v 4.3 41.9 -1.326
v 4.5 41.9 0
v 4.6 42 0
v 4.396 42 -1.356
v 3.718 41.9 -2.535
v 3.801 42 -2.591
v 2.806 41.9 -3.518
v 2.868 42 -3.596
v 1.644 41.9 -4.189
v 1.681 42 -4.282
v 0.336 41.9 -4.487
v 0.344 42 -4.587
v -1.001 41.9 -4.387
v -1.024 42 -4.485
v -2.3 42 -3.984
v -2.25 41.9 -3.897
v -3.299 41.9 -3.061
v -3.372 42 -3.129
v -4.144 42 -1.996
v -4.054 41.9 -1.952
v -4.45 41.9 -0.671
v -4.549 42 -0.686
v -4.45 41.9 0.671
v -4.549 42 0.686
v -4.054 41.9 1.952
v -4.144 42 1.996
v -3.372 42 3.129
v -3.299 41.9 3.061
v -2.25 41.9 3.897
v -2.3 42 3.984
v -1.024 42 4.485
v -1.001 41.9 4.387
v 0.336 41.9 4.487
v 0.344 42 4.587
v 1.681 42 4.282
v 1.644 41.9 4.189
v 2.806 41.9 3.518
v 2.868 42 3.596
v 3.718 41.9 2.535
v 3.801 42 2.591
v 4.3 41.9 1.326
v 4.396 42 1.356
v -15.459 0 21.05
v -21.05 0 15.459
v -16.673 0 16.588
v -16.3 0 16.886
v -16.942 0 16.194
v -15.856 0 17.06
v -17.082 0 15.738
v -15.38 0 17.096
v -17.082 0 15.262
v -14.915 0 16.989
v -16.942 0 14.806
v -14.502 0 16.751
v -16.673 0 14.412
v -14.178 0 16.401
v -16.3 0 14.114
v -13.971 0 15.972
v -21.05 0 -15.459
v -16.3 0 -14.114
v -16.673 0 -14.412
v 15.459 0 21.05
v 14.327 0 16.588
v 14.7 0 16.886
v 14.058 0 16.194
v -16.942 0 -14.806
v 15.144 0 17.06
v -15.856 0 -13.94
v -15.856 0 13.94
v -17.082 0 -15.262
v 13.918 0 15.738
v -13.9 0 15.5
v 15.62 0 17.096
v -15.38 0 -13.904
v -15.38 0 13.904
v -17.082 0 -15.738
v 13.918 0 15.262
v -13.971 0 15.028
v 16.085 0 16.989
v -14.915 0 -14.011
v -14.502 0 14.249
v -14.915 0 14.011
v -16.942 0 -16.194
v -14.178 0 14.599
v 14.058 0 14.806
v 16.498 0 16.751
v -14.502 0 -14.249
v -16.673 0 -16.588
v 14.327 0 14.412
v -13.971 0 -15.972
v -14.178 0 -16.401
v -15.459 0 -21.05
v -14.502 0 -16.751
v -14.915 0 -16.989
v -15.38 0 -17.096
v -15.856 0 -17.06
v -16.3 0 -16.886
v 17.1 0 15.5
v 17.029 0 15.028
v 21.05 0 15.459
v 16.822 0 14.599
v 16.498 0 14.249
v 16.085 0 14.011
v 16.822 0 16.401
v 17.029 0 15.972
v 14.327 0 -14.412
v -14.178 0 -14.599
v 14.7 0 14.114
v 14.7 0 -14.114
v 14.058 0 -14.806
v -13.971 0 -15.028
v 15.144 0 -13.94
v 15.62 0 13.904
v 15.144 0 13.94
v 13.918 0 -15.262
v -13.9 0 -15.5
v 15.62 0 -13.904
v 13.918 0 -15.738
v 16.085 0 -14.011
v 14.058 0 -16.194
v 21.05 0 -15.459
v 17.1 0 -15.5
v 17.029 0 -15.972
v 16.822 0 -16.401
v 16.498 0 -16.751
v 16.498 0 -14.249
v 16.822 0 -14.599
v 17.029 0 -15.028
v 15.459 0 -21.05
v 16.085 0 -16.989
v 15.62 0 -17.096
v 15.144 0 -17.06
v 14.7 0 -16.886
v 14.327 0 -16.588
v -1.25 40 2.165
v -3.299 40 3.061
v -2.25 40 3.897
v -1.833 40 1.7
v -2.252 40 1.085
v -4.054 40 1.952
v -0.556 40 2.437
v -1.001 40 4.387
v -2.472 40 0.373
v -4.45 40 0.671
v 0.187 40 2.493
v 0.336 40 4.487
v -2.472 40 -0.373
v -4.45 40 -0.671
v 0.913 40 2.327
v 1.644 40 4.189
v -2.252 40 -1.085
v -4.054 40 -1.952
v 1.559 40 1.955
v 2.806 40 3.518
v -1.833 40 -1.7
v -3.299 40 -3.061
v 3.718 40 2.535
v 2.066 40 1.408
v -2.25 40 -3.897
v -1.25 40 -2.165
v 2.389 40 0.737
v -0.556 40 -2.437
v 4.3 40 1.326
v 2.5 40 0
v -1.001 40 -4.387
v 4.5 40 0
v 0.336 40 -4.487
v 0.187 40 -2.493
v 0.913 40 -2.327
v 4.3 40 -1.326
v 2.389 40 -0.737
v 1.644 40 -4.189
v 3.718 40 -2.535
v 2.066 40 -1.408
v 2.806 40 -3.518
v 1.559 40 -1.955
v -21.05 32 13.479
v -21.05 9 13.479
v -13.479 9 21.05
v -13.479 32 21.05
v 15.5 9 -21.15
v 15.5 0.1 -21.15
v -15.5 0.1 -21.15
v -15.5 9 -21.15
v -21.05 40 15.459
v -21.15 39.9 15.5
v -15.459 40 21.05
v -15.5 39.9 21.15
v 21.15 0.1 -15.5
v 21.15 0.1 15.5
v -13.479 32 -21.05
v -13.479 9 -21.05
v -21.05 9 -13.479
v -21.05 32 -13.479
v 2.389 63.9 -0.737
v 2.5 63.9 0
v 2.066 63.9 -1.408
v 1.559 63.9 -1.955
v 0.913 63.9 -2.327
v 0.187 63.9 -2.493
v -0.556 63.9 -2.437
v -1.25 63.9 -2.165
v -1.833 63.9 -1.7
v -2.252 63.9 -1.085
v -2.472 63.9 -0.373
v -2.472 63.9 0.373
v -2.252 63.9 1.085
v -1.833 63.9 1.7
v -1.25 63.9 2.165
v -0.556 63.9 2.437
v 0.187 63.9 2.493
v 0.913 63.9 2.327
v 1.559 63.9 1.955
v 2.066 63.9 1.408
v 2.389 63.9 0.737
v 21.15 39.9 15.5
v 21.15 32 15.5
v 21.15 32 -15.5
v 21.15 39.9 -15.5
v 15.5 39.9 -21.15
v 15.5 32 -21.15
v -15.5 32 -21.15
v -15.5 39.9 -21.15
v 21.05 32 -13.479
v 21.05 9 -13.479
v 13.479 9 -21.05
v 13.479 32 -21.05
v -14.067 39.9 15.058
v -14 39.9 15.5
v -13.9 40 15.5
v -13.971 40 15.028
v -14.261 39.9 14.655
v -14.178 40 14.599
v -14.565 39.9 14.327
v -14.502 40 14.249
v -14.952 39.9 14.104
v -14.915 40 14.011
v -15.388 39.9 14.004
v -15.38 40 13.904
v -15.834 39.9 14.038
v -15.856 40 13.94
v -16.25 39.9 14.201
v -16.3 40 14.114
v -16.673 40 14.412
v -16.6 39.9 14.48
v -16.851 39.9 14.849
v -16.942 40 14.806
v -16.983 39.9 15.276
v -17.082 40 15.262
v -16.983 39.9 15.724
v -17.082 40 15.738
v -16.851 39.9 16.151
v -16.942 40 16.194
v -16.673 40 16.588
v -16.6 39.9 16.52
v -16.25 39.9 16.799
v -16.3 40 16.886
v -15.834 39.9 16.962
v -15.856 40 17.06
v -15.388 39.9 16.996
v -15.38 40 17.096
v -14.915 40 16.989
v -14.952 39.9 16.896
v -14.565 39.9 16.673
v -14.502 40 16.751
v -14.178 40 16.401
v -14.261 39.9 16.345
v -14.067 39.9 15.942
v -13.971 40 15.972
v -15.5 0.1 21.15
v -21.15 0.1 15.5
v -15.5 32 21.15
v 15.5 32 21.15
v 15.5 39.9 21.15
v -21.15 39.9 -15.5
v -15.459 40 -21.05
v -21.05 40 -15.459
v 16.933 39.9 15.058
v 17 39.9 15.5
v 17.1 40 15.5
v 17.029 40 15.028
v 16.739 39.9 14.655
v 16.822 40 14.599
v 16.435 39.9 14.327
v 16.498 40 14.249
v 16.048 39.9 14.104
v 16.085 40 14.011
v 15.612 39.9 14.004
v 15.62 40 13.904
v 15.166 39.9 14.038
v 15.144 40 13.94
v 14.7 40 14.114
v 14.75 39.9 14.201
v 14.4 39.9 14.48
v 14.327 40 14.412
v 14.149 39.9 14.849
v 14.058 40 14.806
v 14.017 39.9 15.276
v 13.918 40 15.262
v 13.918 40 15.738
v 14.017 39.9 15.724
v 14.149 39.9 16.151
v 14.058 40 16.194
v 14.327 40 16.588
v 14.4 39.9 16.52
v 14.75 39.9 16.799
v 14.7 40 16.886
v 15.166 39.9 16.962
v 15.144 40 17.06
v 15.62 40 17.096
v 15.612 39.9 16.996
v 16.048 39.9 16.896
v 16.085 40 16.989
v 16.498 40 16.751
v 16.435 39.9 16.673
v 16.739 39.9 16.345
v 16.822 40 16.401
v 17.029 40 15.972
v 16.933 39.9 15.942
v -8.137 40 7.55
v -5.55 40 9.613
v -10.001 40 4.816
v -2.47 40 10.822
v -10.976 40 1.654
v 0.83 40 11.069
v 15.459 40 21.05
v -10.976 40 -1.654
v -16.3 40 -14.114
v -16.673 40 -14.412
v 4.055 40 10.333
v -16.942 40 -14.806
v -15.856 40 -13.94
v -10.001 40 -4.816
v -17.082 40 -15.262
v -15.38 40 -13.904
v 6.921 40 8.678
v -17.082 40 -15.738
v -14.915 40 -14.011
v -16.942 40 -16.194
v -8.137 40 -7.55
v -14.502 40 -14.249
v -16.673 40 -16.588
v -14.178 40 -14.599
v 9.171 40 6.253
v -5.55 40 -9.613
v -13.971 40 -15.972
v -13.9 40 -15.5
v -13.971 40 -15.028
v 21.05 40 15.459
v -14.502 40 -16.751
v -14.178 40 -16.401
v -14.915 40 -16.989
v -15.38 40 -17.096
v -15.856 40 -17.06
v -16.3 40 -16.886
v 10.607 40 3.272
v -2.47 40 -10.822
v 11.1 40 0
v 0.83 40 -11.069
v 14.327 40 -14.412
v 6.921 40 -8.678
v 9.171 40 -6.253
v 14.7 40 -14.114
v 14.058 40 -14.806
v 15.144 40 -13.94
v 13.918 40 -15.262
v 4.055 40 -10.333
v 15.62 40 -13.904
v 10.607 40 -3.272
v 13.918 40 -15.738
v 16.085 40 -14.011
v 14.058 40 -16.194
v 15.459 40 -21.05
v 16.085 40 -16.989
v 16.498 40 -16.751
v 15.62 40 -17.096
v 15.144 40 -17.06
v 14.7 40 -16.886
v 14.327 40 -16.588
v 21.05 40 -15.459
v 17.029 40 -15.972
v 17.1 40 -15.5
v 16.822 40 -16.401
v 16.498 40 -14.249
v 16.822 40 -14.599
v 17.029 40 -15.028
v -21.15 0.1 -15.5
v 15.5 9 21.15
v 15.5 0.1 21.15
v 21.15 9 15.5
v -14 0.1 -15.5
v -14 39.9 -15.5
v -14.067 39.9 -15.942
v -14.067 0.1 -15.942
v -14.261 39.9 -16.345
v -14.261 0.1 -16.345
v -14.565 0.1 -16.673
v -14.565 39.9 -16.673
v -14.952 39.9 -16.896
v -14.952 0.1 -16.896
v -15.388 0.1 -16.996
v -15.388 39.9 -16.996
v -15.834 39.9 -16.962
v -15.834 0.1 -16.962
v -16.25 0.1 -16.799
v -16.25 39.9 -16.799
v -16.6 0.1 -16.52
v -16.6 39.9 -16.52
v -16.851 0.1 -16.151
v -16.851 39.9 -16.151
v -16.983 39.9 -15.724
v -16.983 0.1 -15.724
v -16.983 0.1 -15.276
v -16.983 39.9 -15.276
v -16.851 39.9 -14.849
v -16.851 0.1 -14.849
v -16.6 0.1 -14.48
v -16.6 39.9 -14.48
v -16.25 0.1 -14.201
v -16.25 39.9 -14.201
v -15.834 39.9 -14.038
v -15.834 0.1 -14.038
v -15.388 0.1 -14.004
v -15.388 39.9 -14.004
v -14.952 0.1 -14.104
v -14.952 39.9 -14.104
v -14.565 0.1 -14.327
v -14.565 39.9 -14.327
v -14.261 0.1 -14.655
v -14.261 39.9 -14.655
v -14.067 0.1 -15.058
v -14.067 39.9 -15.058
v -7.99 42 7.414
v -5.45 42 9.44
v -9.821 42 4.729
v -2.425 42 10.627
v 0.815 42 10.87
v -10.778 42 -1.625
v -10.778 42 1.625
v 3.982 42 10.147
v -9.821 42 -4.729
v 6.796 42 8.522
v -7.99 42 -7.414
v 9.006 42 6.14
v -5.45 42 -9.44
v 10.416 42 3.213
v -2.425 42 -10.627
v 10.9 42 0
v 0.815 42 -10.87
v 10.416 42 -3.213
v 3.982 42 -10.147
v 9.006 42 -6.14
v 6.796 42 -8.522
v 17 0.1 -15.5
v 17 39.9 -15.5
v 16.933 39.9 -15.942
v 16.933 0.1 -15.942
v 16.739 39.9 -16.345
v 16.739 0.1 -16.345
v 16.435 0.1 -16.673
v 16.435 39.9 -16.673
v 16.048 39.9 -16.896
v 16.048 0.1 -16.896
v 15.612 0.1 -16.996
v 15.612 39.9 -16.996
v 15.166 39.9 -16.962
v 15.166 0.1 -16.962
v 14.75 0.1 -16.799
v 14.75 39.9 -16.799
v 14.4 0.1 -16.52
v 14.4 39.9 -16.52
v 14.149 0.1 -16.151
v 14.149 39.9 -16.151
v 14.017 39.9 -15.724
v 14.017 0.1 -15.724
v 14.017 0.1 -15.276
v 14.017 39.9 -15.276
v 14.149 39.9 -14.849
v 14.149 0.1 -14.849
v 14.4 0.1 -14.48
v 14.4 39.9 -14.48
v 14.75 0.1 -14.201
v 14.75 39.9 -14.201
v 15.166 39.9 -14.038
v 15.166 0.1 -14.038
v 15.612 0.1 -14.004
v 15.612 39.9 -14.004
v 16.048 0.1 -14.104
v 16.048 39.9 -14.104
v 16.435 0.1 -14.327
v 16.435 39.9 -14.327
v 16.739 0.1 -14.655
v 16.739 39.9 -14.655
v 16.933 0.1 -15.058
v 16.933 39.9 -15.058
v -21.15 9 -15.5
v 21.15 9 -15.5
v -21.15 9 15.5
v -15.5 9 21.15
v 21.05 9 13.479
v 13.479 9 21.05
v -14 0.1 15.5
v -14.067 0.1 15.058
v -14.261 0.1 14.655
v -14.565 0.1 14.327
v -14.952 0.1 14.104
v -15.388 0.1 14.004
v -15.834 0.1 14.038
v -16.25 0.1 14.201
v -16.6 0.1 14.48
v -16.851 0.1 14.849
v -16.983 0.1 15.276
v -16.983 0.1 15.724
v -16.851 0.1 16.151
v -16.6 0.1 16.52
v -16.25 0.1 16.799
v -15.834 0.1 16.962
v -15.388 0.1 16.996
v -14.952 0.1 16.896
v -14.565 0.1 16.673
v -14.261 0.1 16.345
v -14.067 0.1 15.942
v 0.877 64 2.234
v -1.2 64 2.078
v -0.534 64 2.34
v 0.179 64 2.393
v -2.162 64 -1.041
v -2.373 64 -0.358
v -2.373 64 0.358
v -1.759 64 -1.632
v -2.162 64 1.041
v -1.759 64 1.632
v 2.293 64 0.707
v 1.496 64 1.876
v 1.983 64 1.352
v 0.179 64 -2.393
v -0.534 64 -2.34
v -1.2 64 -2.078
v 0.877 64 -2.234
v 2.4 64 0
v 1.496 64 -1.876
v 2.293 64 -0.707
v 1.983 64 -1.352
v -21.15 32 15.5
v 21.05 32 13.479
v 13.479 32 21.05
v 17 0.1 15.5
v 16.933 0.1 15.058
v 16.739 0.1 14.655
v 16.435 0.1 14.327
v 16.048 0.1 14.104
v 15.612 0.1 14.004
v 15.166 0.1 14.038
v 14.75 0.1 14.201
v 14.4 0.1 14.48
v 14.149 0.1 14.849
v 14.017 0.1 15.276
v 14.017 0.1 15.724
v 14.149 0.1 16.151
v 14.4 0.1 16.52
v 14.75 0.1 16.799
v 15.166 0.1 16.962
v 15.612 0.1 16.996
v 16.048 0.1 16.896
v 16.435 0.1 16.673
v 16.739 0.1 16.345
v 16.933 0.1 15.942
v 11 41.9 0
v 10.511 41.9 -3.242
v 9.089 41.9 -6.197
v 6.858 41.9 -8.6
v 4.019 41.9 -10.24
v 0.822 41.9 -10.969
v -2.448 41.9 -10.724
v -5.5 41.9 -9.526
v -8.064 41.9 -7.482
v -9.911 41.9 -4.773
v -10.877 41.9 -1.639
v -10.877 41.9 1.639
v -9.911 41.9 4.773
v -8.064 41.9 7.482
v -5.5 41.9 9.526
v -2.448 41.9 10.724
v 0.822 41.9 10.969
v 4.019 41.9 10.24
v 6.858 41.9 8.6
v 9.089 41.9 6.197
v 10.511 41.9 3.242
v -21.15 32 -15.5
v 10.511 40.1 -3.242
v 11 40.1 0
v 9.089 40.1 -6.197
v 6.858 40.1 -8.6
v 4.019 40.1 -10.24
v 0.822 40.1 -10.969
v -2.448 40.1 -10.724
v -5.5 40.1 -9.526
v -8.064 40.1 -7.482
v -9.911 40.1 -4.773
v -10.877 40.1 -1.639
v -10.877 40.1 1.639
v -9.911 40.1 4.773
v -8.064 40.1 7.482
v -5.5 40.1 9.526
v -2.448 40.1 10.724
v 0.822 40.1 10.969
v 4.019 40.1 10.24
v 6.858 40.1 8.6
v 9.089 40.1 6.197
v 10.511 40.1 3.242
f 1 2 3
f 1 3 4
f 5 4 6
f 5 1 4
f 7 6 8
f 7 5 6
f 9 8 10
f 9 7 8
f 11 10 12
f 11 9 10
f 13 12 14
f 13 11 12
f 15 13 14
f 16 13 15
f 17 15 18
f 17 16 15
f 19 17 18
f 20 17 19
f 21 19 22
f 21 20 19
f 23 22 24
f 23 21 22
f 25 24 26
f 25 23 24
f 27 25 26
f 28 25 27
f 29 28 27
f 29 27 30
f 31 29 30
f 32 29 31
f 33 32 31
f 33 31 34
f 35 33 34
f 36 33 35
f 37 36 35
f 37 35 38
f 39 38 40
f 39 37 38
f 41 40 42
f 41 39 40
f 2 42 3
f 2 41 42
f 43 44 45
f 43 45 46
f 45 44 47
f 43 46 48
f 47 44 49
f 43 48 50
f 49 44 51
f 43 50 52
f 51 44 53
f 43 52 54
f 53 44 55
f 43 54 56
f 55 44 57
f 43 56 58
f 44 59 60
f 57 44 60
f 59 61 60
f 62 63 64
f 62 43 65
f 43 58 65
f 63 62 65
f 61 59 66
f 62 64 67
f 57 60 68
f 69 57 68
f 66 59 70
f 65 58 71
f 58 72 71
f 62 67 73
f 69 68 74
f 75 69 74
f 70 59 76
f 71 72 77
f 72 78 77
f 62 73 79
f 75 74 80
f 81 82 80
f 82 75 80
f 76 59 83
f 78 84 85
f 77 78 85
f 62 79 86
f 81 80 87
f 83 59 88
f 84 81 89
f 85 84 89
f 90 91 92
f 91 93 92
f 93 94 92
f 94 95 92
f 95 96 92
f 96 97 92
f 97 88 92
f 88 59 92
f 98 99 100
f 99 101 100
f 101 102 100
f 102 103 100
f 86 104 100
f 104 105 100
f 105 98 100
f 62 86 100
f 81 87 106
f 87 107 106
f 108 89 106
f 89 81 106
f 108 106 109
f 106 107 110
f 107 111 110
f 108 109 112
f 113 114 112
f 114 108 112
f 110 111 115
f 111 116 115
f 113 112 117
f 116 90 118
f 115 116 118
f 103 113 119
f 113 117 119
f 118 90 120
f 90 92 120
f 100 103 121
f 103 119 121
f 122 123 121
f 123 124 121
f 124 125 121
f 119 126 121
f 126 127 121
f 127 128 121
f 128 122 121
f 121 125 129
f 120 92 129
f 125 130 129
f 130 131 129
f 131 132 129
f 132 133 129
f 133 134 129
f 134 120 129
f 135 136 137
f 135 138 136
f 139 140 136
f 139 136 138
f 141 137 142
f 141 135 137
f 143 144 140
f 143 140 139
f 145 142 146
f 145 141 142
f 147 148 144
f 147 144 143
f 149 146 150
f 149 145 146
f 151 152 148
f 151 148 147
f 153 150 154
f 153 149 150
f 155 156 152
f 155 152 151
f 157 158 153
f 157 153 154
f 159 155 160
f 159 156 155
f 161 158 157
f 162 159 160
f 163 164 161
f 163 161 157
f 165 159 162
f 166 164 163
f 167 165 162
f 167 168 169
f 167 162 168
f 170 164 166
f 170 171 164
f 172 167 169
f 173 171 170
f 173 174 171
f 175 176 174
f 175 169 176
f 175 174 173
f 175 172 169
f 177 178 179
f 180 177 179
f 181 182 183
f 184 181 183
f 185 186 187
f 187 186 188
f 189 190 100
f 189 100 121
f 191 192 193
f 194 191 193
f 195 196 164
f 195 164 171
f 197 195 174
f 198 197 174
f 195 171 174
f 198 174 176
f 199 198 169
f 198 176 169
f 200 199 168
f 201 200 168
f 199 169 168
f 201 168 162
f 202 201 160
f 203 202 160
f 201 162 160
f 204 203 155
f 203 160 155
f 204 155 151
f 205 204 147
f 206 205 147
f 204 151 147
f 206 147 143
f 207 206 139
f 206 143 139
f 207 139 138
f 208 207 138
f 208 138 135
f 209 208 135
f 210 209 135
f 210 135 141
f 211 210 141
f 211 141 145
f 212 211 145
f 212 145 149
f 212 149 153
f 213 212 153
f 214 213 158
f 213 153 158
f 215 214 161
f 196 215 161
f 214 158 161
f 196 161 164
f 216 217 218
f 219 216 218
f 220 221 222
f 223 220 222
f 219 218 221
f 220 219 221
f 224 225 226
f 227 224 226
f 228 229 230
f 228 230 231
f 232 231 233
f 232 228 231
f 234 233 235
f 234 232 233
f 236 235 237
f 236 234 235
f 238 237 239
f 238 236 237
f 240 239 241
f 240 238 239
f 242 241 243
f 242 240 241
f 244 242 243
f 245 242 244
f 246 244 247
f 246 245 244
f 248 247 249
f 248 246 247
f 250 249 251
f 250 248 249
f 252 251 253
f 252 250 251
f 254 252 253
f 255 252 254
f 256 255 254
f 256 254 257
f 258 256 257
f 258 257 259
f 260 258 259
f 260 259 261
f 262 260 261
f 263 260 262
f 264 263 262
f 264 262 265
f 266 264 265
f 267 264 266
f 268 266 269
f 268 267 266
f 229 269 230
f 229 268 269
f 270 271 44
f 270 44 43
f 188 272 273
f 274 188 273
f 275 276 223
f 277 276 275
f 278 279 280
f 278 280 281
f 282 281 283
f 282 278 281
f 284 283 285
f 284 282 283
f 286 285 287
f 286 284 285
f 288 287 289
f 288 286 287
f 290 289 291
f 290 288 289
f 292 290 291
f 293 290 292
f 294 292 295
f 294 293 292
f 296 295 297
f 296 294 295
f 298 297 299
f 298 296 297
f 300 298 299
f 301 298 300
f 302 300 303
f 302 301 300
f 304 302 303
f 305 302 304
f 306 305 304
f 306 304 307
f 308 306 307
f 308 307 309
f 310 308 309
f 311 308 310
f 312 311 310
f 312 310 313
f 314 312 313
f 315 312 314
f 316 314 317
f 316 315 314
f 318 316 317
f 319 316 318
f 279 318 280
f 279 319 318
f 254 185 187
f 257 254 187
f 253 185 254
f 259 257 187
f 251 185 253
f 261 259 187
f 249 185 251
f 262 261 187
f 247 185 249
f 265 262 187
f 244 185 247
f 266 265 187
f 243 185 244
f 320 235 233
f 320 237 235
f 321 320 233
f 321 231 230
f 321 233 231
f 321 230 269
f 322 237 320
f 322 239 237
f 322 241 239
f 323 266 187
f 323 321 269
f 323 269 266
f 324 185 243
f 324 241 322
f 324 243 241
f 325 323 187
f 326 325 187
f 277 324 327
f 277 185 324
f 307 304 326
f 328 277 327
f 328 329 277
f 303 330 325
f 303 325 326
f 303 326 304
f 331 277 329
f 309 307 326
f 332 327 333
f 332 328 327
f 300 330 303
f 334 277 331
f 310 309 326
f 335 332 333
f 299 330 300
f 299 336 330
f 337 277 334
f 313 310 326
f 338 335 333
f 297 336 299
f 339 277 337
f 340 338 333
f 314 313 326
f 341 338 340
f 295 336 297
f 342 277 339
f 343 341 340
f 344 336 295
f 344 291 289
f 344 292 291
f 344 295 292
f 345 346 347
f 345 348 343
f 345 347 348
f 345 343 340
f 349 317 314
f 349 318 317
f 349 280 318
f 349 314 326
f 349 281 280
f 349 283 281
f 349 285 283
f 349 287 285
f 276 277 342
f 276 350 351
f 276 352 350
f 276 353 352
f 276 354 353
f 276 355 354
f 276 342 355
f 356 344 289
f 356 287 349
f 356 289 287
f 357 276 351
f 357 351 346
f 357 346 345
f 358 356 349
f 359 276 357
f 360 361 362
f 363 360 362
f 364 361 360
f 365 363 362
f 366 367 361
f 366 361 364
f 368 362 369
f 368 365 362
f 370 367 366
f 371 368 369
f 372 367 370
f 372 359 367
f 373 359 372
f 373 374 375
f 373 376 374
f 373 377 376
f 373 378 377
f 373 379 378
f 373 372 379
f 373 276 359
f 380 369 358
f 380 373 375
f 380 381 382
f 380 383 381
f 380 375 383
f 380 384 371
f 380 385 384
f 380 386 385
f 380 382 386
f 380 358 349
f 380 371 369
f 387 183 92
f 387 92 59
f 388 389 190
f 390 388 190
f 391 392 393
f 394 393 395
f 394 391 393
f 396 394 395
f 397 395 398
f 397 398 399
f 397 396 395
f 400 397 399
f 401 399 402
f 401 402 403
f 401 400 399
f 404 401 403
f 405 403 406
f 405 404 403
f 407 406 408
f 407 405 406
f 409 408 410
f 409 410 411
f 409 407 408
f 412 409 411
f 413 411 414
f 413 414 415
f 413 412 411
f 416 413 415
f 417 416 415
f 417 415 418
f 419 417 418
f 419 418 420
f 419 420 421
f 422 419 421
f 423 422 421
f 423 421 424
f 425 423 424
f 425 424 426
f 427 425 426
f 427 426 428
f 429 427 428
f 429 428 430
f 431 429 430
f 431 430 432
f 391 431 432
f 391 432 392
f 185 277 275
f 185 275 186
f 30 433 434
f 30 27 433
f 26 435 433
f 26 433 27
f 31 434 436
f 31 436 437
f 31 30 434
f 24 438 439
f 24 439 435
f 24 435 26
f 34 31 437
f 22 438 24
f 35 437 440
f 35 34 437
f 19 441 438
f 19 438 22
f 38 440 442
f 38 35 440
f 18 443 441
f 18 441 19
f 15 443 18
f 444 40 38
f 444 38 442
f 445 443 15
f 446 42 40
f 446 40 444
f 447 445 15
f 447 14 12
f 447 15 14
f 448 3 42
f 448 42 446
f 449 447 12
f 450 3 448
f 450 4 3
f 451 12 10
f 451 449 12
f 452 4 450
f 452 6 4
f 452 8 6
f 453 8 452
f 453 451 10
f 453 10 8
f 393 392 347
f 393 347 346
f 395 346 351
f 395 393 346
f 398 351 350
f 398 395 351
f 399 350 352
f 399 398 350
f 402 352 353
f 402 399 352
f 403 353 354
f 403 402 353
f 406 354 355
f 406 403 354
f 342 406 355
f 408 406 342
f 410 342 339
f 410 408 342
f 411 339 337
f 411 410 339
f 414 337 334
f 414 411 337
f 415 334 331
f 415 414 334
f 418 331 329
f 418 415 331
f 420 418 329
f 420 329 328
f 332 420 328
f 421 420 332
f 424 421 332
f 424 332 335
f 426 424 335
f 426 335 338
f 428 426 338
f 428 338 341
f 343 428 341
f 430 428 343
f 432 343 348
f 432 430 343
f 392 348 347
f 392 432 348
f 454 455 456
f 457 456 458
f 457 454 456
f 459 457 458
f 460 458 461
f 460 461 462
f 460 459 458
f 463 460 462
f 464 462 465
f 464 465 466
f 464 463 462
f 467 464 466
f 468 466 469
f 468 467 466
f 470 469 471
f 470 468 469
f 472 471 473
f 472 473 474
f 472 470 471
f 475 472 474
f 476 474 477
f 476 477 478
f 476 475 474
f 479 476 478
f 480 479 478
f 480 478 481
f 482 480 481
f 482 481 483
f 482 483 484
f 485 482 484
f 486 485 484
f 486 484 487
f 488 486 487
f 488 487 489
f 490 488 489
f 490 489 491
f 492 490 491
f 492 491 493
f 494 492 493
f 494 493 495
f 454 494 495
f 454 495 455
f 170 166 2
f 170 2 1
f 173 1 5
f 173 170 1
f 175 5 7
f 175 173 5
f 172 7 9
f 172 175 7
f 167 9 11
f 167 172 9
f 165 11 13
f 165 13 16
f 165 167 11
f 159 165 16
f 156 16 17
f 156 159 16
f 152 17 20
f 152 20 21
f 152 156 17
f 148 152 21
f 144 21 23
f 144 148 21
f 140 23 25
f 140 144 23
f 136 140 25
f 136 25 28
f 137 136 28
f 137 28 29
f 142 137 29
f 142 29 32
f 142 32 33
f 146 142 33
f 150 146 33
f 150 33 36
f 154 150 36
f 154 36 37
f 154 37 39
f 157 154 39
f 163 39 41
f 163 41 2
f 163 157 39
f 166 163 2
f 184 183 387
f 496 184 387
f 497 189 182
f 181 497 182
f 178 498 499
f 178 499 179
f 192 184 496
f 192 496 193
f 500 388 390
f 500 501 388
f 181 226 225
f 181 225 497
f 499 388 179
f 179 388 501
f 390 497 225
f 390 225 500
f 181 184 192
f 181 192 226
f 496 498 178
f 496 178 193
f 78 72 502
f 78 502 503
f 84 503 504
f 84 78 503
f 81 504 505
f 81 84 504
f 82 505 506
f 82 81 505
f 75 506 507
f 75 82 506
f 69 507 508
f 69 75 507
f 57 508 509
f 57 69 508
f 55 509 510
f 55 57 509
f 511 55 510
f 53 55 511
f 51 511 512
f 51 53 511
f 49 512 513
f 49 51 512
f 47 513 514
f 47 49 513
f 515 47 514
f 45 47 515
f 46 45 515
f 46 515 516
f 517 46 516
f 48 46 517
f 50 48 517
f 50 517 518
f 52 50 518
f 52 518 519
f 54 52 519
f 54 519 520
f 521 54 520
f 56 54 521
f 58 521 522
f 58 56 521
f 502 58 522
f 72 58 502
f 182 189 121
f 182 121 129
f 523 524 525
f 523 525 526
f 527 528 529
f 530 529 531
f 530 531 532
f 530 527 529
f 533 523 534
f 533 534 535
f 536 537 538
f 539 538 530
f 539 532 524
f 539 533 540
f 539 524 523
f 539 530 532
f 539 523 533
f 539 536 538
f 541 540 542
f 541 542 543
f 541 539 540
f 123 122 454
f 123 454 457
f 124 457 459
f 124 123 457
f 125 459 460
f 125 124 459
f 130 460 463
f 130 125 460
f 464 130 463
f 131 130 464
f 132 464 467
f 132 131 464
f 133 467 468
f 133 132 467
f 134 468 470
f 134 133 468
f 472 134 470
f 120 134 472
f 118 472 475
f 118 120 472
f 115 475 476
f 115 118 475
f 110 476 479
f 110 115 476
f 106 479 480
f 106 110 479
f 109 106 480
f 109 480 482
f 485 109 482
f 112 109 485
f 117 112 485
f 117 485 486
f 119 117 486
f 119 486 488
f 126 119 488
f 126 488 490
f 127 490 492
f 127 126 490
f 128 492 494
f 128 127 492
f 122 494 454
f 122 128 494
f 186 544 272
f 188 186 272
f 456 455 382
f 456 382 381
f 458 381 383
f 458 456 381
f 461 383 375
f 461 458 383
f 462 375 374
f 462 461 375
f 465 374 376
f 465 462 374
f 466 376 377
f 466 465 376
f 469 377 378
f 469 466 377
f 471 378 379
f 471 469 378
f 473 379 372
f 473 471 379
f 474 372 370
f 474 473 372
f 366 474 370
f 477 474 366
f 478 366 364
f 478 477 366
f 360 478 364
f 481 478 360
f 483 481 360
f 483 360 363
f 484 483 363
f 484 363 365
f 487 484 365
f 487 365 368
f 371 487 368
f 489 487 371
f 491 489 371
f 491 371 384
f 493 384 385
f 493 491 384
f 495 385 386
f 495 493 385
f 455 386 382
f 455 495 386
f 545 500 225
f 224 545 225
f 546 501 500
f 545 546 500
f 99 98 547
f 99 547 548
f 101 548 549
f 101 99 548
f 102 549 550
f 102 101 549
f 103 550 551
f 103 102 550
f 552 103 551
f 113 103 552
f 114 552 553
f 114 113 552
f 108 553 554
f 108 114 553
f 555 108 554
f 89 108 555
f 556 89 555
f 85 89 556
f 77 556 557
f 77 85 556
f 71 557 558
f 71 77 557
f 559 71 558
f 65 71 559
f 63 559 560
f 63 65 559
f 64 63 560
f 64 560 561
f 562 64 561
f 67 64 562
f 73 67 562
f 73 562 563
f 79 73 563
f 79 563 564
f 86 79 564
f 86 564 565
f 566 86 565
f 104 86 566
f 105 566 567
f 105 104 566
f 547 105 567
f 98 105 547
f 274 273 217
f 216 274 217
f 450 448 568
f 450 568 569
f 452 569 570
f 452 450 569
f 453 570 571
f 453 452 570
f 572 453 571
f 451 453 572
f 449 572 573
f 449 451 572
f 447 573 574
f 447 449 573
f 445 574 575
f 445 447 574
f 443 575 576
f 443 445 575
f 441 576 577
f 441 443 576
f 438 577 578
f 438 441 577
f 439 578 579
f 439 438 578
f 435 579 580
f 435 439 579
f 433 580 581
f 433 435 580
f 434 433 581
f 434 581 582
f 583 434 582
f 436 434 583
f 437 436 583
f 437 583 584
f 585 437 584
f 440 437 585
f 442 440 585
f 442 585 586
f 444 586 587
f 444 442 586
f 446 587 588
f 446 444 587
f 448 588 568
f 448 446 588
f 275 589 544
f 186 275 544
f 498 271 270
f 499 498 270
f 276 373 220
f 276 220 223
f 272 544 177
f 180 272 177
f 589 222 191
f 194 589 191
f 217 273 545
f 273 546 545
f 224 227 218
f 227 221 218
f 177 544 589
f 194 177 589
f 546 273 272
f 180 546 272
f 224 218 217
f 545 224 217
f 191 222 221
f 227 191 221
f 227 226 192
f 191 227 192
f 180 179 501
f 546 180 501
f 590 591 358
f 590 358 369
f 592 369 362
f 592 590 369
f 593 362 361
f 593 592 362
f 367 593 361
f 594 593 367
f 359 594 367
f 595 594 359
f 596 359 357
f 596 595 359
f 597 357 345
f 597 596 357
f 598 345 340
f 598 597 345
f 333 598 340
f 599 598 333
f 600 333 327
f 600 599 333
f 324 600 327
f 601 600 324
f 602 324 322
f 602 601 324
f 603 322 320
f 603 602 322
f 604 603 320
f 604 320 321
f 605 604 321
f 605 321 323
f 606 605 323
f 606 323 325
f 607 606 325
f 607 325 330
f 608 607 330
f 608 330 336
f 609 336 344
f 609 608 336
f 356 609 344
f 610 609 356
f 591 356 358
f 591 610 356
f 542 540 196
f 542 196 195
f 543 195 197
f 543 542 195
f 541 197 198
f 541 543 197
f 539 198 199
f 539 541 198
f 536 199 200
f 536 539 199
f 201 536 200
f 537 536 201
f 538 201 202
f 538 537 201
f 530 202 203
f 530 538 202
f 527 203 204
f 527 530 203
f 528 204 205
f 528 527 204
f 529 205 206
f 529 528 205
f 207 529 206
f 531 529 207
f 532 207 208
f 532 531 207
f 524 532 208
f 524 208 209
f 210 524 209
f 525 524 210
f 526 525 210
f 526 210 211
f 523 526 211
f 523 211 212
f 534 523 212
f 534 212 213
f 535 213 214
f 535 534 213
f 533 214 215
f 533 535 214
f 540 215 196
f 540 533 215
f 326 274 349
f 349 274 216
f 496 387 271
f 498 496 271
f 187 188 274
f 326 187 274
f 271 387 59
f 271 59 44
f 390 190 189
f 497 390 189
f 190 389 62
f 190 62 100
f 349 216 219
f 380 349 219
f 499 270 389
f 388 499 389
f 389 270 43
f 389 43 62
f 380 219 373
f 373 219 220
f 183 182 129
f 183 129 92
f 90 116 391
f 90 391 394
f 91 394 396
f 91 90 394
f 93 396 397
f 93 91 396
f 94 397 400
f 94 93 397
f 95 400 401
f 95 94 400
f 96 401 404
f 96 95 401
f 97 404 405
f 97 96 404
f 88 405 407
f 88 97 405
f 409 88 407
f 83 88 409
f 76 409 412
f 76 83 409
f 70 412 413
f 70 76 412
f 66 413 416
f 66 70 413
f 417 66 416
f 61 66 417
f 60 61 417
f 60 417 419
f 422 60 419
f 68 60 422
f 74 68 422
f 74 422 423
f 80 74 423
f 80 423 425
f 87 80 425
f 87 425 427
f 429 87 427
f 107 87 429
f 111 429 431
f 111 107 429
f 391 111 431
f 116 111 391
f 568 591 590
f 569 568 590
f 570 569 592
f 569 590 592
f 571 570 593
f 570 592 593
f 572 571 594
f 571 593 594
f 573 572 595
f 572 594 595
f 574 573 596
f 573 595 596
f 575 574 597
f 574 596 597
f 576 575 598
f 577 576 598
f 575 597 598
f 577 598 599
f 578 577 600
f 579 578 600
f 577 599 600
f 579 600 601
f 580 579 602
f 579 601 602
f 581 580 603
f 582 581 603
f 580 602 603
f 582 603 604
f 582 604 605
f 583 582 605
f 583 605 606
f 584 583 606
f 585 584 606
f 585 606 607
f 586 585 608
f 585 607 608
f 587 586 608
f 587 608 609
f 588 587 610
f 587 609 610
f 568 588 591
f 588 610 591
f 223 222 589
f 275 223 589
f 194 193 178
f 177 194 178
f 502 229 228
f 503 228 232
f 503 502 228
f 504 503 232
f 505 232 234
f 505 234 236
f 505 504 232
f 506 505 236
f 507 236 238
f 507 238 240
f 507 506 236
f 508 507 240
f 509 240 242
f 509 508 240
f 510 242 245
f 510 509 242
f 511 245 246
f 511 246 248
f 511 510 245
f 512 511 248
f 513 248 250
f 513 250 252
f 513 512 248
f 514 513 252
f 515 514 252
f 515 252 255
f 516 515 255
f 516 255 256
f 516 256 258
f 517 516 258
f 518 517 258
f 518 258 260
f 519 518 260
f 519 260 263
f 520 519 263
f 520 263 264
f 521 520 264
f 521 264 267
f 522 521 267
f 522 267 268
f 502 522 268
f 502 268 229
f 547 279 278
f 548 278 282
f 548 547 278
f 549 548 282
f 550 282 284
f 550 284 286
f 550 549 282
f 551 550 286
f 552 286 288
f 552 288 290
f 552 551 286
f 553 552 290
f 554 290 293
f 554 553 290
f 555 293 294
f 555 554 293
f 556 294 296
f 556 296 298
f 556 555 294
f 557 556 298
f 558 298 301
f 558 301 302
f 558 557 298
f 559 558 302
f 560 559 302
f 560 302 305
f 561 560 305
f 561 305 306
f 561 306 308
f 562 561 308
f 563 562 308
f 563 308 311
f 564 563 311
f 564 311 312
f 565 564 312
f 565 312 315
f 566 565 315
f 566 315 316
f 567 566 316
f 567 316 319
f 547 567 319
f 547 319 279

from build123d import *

# Parameters (mm, degrees)
SKETCH1_R           = 1.5
BOSS_EXTRUDE1_DEPTH = 9
SKETCH4_R           = 1.5
BOSS_EXTRUDE4_DEPTH = 23
SKETCH5_R           = 1.5
BOSS_EXTRUDE6_DEPTH = 8
SKETCH2_R           = 11
SKETCH2_R_2         = 4.5
BOSS_EXTRUDE2_DEPTH = 2
SKETCH3_R           = 2.5
BOSS_EXTRUDE3_DEPTH = 24
CHAMFER1_SIZE       = 0.1


with BuildPart() as part:
    # Sketch1 → Boss-Extrude1 (new body)
    with BuildSketch(Plane(origin=(0, 0, 0), x_dir=(1, 0, 0), z_dir=(0, 1, 0))):
        Polygon((-15.5, -21.15), (15.5, -21.15), (21.15, -15.5), (21.15, 15.5), (15.5, 21.15), (-15.5, 21.15), (-21.15, 15.5), (-21.15, -15.5), align=None)
        with Locations((-15.5, 15.5)):
            Circle(SKETCH1_R, mode=Mode.SUBTRACT)
        with Locations((15.5, -15.5)):
            Circle(SKETCH1_R, mode=Mode.SUBTRACT)
        with Locations((15.5, 15.5)):
            Circle(SKETCH1_R, mode=Mode.SUBTRACT)
        with Locations((-15.5, -15.5)):
            Circle(SKETCH1_R, mode=Mode.SUBTRACT)
    extrude(amount=BOSS_EXTRUDE1_DEPTH)

    # Sketch4 → Boss-Extrude4 (add)
    with BuildSketch(Plane(origin=(0, 9, 0), x_dir=(1, 0, 0), z_dir=(0, 1, 0))):
        Polygon((13.478679656, 21.05), (-13.478679656, 21.05), (-21.05, 13.478679656), (-21.05, -13.478679656), (-13.478679656, -21.05), (13.478679656, -21.05), (21.05, -13.478679656), (21.05, 13.478679656), align=None)
        with Locations((-15.5, 15.5)):
            Circle(SKETCH4_R, mode=Mode.SUBTRACT)
        with Locations((15.5, 15.5)):
            Circle(SKETCH4_R, mode=Mode.SUBTRACT)
        with Locations((15.5, -15.5)):
            Circle(SKETCH4_R, mode=Mode.SUBTRACT)
        with Locations((-15.5, -15.5)):
            Circle(SKETCH4_R, mode=Mode.SUBTRACT)
    extrude(amount=BOSS_EXTRUDE4_DEPTH)

    # Sketch5 → Boss-Extrude6 (add)
    with BuildSketch(Plane(origin=(0, 32, 0), x_dir=(1, 0, 0), z_dir=(0, 1, 0))):
        Polygon((-15.5, 21.15), (-21.15, 15.5), (-21.15, -15.5), (-15.5, -21.15), (15.5, -21.15), (21.15, -15.5), (21.15, 15.5), (15.5, 21.15), align=None)
        with Locations((15.5, 15.5)):
            Circle(SKETCH5_R, mode=Mode.SUBTRACT)
        with Locations((-15.5, 15.5)):
            Circle(SKETCH5_R, mode=Mode.SUBTRACT)
        with Locations((-15.5, -15.5)):
            Circle(SKETCH5_R, mode=Mode.SUBTRACT)
        with Locations((15.5, -15.5)):
            Circle(SKETCH5_R, mode=Mode.SUBTRACT)
    extrude(amount=BOSS_EXTRUDE6_DEPTH)

    # Sketch2 → Boss-Extrude2 (add)
    with BuildSketch(Plane(origin=(0, 40, 0), x_dir=(1, 0, 0), z_dir=(0, 1, 0))):
        Circle(SKETCH2_R)
        Circle(SKETCH2_R_2, mode=Mode.SUBTRACT)
    extrude(amount=BOSS_EXTRUDE2_DEPTH)

    # Sketch3 → Boss-Extrude3 (add)
    with BuildSketch(Plane(origin=(0, 40, 0), x_dir=(1, 0, 0), z_dir=(0, 1, 0))):
        Circle(SKETCH3_R)
    extrude(amount=BOSS_EXTRUDE3_DEPTH)

    # Chamfer1
    chamfer1_edges = [part.edges().sort_by_distance(p)[0] for p in [
        (-21.15, 0, 0),
        (-18.325, 0, -18.325),
        (-11, 42, 0),
        (-11, 40, 0),
        (-4.5, 42, 0),
        (-2.5, 64, 0),
        (-17, 0, -15.5),
        (14, 0, 15.5),
        (14, 0, -15.5),
        (-17, 0, 15.5),
        (0, 40, -21.15),
        (-18.325, 40, -18.325),
        (-21.15, 40, 0),
        (-18.325, 40, 18.325),
        (0, 40, 21.15),
        (18.325, 40, 18.325),
        (21.15, 40, 0),
        (18.325, 40, -18.325),
        (0, 0, -21.15),
        (14, 40, -15.5),
        (18.325, 0, -18.325),
        (-17, 40, -15.5),
        (-17, 40, 15.5),
        (14, 40, 15.5),
        (21.15, 0, 0),
        (18.325, 0, 18.325),
        (0, 0, 21.15),
        (-18.325, 0, 18.325),
    ]]
    chamfer(chamfer1_edges, length=CHAMFER1_SIZE)


solid = part.part
